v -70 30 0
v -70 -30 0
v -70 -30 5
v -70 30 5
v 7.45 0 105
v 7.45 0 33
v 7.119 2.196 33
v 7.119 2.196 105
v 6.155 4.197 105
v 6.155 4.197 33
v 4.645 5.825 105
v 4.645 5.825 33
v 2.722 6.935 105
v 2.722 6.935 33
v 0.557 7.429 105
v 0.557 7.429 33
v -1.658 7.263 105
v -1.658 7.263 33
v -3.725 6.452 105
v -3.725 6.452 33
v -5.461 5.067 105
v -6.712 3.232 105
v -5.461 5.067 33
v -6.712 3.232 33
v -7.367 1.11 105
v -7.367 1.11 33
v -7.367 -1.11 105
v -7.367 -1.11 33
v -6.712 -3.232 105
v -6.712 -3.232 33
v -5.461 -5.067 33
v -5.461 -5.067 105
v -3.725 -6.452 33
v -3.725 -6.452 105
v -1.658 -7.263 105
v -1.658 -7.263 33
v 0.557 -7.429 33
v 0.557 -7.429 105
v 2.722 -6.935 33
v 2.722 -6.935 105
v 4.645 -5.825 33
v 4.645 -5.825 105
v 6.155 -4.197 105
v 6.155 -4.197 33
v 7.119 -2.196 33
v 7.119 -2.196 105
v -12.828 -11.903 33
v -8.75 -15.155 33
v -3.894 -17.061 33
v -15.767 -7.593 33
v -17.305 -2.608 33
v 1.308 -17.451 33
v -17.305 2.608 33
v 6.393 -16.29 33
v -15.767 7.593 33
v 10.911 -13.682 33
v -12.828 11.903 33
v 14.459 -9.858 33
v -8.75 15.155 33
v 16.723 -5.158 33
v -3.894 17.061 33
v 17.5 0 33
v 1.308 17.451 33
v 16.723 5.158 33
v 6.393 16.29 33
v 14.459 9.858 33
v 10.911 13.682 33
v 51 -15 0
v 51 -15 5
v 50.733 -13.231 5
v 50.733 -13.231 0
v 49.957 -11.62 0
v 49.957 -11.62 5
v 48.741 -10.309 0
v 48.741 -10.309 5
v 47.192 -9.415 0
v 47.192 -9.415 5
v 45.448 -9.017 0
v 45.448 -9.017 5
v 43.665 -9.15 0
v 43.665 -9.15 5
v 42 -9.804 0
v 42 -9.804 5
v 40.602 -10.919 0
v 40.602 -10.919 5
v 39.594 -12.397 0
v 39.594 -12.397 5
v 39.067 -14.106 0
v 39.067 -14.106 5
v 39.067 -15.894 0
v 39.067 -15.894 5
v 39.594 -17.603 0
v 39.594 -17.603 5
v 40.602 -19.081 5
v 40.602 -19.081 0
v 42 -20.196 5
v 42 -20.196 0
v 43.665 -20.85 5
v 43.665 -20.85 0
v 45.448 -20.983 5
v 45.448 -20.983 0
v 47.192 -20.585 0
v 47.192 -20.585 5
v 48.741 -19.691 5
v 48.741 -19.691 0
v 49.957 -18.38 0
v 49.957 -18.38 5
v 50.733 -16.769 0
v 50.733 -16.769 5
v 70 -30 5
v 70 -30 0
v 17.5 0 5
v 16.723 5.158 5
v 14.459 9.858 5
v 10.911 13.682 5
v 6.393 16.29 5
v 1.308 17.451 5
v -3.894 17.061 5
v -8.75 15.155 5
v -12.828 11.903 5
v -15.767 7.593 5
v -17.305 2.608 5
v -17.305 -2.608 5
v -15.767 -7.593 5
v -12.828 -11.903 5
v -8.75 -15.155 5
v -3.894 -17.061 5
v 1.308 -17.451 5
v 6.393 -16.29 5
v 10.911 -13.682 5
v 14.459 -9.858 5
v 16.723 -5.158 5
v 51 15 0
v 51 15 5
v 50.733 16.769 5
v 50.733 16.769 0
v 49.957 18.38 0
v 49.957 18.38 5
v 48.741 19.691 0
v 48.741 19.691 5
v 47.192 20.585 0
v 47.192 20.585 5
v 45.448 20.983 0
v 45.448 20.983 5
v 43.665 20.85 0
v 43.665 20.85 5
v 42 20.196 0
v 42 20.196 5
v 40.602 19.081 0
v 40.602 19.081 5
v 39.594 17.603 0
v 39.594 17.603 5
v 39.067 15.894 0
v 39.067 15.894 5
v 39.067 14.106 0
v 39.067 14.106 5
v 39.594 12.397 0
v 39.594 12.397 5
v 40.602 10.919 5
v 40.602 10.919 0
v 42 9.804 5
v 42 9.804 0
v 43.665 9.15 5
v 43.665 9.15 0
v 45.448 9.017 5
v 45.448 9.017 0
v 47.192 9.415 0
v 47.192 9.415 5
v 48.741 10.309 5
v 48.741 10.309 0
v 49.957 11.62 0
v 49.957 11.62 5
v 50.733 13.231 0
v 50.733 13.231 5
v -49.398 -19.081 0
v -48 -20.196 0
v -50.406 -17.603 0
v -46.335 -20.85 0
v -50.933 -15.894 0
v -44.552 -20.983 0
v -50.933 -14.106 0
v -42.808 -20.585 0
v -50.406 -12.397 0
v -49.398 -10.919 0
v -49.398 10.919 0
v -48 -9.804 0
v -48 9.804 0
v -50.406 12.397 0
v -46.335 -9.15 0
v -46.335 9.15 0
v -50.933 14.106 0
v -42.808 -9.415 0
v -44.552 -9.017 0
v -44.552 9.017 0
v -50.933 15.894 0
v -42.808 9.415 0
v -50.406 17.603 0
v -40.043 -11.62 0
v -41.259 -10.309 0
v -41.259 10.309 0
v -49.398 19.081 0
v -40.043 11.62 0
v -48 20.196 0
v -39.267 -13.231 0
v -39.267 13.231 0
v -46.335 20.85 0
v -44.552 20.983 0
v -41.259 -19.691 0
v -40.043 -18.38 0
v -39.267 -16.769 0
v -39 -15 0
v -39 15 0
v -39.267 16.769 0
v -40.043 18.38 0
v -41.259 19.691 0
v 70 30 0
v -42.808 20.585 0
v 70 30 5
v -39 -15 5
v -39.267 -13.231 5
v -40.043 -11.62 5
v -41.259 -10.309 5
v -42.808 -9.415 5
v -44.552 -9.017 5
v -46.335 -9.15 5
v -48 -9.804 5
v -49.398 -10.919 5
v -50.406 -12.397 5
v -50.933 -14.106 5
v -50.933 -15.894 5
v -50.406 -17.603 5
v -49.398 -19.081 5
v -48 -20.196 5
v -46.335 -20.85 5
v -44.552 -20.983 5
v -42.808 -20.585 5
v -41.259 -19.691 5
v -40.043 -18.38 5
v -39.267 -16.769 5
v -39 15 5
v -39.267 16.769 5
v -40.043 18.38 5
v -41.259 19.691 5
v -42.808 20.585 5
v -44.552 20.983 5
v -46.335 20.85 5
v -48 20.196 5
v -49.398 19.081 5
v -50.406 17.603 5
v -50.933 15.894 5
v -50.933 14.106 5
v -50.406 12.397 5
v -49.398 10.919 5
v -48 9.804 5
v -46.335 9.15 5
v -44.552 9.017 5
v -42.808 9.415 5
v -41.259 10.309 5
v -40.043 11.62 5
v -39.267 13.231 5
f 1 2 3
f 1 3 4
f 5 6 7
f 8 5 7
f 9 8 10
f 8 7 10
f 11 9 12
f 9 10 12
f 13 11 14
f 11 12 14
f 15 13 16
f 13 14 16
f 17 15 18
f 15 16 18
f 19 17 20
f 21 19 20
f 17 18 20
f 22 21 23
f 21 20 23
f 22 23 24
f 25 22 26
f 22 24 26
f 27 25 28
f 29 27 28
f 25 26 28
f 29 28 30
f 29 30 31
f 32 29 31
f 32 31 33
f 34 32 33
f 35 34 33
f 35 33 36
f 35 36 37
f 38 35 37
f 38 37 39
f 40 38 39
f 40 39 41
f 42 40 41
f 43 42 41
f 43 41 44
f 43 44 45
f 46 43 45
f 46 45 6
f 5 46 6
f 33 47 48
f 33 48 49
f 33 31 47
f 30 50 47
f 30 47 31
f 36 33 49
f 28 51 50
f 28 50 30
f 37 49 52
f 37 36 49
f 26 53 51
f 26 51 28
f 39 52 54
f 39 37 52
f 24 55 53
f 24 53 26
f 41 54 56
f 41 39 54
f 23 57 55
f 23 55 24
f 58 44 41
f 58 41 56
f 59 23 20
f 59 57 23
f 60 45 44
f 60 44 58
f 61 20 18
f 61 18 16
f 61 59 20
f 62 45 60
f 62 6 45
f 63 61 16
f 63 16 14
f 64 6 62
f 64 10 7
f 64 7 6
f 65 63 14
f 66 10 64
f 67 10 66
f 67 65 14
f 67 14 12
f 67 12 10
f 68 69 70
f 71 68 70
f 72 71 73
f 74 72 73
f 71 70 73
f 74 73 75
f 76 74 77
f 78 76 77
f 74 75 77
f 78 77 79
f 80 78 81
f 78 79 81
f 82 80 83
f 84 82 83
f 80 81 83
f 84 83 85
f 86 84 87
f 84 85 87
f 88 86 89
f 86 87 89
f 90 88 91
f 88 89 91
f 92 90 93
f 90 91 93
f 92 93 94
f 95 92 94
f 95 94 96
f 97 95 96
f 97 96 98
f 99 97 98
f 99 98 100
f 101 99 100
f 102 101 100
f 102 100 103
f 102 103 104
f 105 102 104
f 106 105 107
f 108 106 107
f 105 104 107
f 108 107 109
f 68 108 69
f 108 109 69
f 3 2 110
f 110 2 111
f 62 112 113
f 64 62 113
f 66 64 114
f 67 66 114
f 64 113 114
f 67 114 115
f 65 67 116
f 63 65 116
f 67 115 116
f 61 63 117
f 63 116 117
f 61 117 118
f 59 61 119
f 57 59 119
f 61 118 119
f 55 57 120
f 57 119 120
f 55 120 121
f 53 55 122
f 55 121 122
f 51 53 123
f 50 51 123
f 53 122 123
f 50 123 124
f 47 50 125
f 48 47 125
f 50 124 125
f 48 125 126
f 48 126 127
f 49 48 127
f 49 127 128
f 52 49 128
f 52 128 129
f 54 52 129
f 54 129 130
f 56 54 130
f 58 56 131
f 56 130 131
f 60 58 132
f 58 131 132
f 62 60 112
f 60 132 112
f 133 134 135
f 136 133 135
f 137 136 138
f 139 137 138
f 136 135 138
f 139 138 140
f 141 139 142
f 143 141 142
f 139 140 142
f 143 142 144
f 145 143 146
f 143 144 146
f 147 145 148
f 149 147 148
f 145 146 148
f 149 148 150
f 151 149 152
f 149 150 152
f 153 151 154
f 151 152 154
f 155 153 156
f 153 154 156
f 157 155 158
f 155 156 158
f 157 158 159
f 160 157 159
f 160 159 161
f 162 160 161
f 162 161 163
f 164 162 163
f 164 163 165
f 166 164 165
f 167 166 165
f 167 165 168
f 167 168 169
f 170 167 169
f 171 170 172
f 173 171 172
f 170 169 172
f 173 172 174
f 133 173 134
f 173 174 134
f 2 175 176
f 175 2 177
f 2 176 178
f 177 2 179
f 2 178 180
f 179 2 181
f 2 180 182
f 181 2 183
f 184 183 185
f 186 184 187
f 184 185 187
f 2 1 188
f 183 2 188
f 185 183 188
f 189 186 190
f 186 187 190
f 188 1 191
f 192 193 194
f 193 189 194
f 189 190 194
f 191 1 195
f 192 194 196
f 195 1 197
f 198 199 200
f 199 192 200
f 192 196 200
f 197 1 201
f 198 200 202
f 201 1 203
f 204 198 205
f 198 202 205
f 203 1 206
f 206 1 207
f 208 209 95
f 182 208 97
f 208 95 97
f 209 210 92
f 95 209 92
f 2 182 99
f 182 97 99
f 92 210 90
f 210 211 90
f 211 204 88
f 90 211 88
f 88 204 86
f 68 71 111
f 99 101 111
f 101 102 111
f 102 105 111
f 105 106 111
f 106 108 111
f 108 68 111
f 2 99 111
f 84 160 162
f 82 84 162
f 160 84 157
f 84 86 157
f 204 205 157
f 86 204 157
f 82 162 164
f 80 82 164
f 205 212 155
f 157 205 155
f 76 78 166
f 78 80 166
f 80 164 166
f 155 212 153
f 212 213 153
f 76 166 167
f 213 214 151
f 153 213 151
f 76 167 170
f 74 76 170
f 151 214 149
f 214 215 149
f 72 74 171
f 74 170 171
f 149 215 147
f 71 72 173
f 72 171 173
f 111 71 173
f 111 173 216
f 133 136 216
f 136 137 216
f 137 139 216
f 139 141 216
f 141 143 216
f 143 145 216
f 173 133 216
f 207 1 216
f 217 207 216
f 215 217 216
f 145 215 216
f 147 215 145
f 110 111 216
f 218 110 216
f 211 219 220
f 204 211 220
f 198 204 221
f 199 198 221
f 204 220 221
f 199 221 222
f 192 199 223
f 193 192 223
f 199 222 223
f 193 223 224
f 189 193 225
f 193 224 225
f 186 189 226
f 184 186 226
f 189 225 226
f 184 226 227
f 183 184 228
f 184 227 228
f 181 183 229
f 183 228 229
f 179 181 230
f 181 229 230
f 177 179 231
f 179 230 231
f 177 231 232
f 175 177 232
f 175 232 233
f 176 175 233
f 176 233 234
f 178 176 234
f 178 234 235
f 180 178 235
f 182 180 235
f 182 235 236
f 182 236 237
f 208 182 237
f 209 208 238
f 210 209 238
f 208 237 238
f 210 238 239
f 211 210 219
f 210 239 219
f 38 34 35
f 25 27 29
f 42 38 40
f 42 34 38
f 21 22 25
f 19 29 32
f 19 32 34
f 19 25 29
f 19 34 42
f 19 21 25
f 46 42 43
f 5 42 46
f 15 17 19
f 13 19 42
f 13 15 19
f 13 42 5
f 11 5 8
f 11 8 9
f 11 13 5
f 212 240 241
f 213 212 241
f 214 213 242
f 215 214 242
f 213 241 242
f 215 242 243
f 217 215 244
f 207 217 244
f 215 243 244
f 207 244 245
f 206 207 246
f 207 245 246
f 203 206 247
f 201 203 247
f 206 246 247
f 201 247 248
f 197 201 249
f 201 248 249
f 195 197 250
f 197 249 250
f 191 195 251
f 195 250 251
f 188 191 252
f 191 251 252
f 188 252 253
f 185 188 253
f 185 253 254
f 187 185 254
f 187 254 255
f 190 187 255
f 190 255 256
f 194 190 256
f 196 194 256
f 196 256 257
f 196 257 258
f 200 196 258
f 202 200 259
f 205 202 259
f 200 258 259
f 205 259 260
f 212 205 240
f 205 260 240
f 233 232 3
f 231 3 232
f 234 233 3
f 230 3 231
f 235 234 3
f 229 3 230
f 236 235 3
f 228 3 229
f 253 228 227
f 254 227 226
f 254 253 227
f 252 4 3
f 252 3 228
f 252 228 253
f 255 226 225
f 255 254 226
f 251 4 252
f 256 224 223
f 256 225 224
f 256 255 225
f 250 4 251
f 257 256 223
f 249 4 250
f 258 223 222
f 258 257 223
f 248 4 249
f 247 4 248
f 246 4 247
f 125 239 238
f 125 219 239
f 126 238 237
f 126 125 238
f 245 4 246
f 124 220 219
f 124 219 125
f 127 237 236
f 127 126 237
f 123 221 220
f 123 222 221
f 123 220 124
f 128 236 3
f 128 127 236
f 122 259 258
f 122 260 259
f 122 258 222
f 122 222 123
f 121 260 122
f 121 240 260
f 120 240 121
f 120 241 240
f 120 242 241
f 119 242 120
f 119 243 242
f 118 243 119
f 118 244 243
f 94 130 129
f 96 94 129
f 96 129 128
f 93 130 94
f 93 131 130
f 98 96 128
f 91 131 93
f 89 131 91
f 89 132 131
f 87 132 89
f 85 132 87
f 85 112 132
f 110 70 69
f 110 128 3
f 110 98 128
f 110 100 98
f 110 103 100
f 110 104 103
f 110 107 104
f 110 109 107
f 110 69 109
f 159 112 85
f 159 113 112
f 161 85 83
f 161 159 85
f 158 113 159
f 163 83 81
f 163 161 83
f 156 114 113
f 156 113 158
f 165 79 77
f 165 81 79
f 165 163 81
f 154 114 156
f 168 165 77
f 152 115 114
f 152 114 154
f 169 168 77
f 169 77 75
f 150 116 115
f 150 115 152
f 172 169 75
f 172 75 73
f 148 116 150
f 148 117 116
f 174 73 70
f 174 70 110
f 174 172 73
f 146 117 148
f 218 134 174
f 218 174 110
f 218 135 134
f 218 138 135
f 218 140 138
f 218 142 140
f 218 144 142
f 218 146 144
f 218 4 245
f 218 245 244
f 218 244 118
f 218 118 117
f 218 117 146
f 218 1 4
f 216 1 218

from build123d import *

# Parameters (mm, degrees)
SKETCH1_W                = 140
SKETCH1_H                = 60
BOSS_EXTRUDE1_DEPTH      = 5
SKETCH2_R                = 7.45
SKETCH2_R_2              = 6
CUT_EXTRUDE1_DEPTH       = 5
BOSS_EXTRUDE3_DEPTH      = 100
BOSS_EXTRUDE3_DEPTH_BACK = 5
SKETCH3_R                = 7.45
SKETCH4_R                = 17.5
BOSS_EXTRUDE4_DEPTH      = 28


with BuildPart() as part:
    # Sketch1 → Boss-Extrude1 (new body)
    with BuildSketch(Plane.XY):
        Rectangle(SKETCH1_W, SKETCH1_H)
    extrude(amount=BOSS_EXTRUDE1_DEPTH)

    # Sketch2 → Cut-Extrude1 (cut)
    with BuildSketch(Plane.XY.offset(5)):
        Circle(SKETCH2_R)
        with Locations((-45, 15)):
            Circle(SKETCH2_R_2)
        with Locations((45, 15)):
            Circle(SKETCH2_R_2)
        with Locations((-45, -15)):
            Circle(SKETCH2_R_2)
        with Locations((45, -15)):
            Circle(SKETCH2_R_2)
    extrude(amount=-CUT_EXTRUDE1_DEPTH, mode=Mode.SUBTRACT)

    # Sketch3 → Boss-Extrude3 (add, two sides: drawn at the far end of the back side and taken through both)
    with BuildSketch(Plane.XY.offset(5).offset(-BOSS_EXTRUDE3_DEPTH_BACK)):
        Circle(SKETCH3_R)
    extrude(amount=BOSS_EXTRUDE3_DEPTH + BOSS_EXTRUDE3_DEPTH_BACK)

    # Sketch4 → Boss-Extrude4 (add)
    with BuildSketch(Plane.XY.offset(5)):
        Circle(SKETCH4_R)
    extrude(amount=BOSS_EXTRUDE4_DEPTH)


solid = part.part
